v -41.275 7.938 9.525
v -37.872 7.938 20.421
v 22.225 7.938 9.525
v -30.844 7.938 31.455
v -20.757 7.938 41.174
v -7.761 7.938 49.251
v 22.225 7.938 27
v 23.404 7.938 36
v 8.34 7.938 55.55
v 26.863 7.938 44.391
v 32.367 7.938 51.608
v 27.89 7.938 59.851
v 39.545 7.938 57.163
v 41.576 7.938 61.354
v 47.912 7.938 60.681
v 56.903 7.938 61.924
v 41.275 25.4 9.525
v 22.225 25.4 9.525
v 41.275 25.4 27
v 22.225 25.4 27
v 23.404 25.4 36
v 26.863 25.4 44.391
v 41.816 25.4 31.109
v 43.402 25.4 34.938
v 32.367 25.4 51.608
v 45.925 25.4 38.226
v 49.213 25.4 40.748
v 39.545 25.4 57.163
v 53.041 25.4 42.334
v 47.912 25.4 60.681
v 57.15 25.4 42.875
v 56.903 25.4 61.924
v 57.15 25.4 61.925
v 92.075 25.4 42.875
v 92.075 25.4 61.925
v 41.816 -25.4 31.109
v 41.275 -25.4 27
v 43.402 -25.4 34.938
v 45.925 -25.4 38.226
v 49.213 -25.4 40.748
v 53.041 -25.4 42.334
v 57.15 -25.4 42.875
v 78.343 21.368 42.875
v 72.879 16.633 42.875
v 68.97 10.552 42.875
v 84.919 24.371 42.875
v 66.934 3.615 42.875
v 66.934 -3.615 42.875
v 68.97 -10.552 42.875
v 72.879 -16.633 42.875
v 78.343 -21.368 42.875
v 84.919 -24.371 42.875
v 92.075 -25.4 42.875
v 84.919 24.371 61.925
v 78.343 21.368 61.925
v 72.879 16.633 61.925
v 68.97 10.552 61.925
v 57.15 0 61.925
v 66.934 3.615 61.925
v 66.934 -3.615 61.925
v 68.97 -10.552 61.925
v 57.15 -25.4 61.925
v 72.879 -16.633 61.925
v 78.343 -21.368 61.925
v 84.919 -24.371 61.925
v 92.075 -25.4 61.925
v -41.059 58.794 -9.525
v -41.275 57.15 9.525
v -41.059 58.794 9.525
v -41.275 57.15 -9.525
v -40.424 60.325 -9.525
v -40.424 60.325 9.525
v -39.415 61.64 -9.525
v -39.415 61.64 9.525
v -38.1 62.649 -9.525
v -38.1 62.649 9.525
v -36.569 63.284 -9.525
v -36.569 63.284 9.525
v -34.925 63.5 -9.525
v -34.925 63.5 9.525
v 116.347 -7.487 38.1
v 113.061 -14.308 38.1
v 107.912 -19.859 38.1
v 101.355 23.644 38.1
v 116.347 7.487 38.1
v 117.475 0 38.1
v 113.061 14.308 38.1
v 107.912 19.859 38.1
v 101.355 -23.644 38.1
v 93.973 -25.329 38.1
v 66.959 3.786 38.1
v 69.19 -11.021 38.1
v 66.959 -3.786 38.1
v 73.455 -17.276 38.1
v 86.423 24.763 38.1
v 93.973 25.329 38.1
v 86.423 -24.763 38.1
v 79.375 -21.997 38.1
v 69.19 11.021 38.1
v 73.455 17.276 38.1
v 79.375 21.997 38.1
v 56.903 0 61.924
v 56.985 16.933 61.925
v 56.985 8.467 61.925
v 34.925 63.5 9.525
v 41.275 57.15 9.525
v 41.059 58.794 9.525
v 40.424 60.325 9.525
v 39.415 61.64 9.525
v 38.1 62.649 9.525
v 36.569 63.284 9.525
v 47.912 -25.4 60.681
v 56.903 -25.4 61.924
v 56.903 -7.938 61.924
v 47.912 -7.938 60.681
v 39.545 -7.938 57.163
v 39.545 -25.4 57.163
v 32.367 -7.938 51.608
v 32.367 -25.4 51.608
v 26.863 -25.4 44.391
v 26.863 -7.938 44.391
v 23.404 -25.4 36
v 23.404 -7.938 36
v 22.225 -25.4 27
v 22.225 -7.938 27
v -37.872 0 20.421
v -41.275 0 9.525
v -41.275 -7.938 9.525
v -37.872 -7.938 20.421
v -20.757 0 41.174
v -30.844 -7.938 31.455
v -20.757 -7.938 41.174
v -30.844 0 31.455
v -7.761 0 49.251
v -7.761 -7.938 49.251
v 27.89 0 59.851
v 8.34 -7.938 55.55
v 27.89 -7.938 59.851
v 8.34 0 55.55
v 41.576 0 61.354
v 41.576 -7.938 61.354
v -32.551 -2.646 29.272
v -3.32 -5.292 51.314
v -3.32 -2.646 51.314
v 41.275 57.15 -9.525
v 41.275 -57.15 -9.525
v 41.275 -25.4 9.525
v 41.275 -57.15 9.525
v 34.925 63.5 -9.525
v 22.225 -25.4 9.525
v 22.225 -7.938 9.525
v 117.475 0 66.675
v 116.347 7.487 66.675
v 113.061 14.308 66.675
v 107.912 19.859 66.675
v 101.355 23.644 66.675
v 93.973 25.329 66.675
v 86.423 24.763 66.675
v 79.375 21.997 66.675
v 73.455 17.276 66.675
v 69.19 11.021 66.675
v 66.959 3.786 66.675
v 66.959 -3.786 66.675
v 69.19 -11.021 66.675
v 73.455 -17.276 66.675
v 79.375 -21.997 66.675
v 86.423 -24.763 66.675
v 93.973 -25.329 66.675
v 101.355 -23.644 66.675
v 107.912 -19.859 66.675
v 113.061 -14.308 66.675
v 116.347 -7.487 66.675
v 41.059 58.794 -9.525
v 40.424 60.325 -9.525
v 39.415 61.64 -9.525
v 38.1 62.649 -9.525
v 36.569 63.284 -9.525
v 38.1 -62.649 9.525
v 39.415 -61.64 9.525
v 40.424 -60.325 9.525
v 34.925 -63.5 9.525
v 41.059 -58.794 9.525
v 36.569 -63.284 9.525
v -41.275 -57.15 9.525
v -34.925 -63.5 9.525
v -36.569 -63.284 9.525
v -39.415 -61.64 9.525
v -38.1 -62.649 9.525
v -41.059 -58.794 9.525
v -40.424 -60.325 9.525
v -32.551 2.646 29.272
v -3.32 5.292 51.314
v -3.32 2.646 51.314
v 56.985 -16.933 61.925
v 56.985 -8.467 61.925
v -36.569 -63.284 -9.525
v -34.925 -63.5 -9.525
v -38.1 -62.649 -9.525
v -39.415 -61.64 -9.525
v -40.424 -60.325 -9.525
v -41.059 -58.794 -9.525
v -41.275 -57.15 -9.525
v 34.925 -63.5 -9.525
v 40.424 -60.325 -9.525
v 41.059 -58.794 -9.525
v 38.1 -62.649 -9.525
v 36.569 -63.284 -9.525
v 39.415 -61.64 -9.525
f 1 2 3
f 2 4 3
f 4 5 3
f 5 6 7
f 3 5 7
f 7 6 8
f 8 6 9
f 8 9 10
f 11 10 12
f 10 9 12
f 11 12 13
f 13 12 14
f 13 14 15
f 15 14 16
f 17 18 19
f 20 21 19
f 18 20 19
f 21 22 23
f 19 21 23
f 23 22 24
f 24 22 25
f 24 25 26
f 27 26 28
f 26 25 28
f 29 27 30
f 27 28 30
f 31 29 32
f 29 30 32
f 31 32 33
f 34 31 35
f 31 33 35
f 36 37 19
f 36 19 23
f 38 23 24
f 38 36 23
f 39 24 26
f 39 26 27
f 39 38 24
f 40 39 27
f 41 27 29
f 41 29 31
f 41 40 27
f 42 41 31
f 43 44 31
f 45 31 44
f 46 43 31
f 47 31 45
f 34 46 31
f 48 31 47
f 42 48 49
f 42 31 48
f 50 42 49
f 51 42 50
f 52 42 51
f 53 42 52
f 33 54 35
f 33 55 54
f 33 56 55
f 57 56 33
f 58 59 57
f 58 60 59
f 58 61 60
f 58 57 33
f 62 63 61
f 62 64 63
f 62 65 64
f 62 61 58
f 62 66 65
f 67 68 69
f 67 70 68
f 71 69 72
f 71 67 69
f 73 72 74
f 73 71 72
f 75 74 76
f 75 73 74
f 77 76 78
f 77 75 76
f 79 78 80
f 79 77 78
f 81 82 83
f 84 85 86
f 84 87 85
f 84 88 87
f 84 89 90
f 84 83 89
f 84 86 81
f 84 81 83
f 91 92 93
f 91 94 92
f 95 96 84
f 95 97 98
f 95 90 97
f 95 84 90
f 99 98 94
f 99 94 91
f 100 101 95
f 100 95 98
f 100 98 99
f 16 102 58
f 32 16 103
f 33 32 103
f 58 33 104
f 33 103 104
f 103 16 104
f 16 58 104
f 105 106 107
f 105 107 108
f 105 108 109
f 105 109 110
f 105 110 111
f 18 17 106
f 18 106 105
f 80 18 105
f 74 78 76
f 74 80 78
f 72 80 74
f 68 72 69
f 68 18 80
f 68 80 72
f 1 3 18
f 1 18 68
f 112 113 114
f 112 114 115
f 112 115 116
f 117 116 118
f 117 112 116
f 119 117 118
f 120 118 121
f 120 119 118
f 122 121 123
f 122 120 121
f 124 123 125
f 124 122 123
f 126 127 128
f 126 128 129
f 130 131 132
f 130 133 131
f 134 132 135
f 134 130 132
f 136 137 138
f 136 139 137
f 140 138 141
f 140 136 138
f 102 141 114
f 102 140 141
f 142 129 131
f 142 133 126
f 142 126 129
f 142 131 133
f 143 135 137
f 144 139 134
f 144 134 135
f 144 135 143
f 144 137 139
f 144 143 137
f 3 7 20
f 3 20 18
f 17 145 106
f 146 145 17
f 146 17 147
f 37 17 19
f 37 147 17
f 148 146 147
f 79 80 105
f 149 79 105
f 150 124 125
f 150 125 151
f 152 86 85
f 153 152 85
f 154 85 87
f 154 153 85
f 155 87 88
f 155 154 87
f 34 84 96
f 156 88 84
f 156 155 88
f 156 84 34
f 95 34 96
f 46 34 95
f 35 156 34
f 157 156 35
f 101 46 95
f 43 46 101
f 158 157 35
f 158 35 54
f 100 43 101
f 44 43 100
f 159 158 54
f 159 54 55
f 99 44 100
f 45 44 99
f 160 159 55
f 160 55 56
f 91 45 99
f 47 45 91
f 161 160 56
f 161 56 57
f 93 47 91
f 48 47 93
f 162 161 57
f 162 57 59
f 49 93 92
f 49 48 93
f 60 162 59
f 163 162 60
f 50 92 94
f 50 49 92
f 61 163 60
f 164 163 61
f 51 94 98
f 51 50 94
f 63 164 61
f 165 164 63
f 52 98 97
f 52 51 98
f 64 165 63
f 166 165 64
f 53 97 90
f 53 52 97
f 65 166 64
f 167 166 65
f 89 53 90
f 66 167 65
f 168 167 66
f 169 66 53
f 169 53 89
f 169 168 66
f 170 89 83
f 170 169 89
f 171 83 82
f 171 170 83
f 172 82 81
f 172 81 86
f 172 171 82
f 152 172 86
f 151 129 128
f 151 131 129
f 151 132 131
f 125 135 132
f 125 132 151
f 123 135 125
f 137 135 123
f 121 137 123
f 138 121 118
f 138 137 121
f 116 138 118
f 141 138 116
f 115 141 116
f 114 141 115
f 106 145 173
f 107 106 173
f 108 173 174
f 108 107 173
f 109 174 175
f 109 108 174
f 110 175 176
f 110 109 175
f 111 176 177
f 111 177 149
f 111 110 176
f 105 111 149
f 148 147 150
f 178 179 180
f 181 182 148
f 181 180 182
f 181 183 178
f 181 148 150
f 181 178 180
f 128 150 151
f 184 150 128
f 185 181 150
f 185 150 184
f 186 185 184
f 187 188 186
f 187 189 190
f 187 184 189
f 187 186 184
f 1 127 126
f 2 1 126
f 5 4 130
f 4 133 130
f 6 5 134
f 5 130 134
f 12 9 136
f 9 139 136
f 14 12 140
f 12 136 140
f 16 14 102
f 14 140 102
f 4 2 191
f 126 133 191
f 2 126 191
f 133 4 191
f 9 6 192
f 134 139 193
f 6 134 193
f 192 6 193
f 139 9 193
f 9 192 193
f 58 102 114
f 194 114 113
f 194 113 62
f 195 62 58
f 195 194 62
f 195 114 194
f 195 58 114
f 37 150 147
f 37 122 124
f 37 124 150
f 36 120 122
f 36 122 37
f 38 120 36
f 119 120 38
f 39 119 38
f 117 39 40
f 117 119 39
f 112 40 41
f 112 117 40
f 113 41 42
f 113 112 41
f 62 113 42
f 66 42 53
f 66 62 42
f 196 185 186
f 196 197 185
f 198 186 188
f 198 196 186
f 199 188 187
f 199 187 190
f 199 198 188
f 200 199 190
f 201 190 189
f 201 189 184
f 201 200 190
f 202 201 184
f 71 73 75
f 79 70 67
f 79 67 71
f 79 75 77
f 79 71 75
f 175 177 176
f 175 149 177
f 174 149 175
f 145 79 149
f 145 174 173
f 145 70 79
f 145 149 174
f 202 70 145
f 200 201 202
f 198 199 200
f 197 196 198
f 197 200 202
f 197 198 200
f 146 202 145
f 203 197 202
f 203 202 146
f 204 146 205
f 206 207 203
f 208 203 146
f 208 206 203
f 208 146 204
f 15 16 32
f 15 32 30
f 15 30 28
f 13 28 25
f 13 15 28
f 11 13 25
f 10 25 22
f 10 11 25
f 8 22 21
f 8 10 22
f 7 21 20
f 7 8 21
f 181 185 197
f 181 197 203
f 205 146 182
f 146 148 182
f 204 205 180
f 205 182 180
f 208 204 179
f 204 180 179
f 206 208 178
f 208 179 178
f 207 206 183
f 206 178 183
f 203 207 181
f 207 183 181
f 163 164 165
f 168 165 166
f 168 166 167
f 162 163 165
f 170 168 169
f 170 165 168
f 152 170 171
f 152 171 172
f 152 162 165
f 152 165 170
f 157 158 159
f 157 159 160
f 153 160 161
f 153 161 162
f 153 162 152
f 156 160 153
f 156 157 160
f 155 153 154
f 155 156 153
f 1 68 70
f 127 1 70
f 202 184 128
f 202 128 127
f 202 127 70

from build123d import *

# Parameters (mm, degrees)
F1_DEPTH = 63.5
F0_W     = 25.4
F0_H     = 19.05
F2_DEPTH = 25.4
F3_DEPTH = 7.9375
F5_R     = 6.35


with BuildPart() as f1:
    # F0 (on Front) → F1 (new body, symmetric)
    with BuildSketch(Plane.XZ):
        Polygon((41.275, -9.525), (41.275, 9.525), (22.225, 9.525), (-41.275, 9.525), (-41.275, -9.525), align=None)
    extrude(amount=F1_DEPTH, both=True)

    # F0 (on Front) → F2 (join, symmetric)
    with BuildSketch(Plane.XZ):
        with BuildLine():
            Line((22.225, 9.525), (41.275, 9.525))
            Line((41.275, 9.525), (41.275, 27.0002))
            ThreePointArc((41.275, 27.0002), (45.9246798487, 38.2255201513), (57.15, 42.8752))
            Line((57.15, 42.8752), (66.675, 42.8752))
            Line((66.675, 42.8752), (66.675, 61.9252))
            Line((66.675, 61.9252), (57.15, 61.9252))
            add(Edge.make_bspline(
                [(56.9028538387, 61.9243255263), (56.9851686946, 61.9246577884), (57.0675507307, 61.9249493028), (57.15, 61.9252)],
                knots=[111.3887853631, 111.3887853631, 111.3887853631, 111.3887853631, 111.5045361635, 111.5045361635, 111.5045361635, 111.5045361635], degree=3))
            ThreePointArc((56.9028538387, 61.9243255263), (32.3670703438, 51.6083698356), (22.225, 27.0002))
            Line((22.225, 27.0002), (22.225, 9.525))
        make_face()
        with Locations((79.375, 52.4002)):
            Rectangle(F0_W, F0_H)
    extrude(amount=F2_DEPTH, both=True)

    # F0 (on Front) → F3 (join, symmetric)
    with BuildSketch(Plane.XZ):
        Polygon((41.275, -9.525), (41.275, 9.525), (22.225, 9.525), (-41.275, 9.525), (-41.275, -9.525), align=None)
        with BuildLine():
            Line((22.225, 9.525), (41.275, 9.525))
            Line((41.275, 9.525), (41.275, 27.0002))
            ThreePointArc((41.275, 27.0002), (45.9246798487, 38.2255201513), (57.15, 42.8752))
            Line((57.15, 42.8752), (66.675, 42.8752))
            Line((66.675, 42.8752), (66.675, 61.9252))
            Line((66.675, 61.9252), (57.15, 61.9252))
            add(Edge.make_bspline(
                [(56.9028538387, 61.9243255263), (56.9851686946, 61.9246577884), (57.0675507307, 61.9249493028), (57.15, 61.9252)],
                knots=[111.3887853631, 111.3887853631, 111.3887853631, 111.3887853631, 111.5045361635, 111.5045361635, 111.5045361635, 111.5045361635], degree=3))
            ThreePointArc((56.9028538387, 61.9243255263), (32.3670703438, 51.6083698356), (22.225, 27.0002))
            Line((22.225, 27.0002), (22.225, 9.525))
        make_face()
        with Locations((79.375, 52.4002)):
            Rectangle(F0_W, F0_H)
        with BuildLine():
            Line((-41.275, 9.525), (22.225, 9.525))
            Line((22.225, 9.525), (22.225, 27.0002))
            ThreePointArc((22.225, 27.0002), (32.3670703438, 51.6083698356), (56.9028538387, 61.9243255263))
            add(Edge.make_bspline(
                [(-41.275, 9.525), (-39.3105568509, 23.5502866189), (-22.3100050541, 61.6045845118), (56.9028538387, 61.9243255263)],
                knots=[0, 0, 0, 0, 111.3887853631, 111.3887853631, 111.3887853631, 111.3887853631], degree=3))
        make_face()
    extrude(amount=F3_DEPTH, both=True)

    # F0 (on Front) → F4 (revolve)
    with BuildSketch(Plane.XZ):
        Polygon((92.075, 61.9252), (92.075, 42.8752), (92.075, 38.1), (117.475, 38.1), (117.475, 66.675), (92.075, 66.675), align=None)
    revolve(axis=Axis((92.075, 0, 52.3875), (0, 0, 1)))

    # F5
    f5_edges = [f1.edges().sort_by_distance(p)[0] for p in [
        (-41.275, -63.5, 0),
        (41.275, -63.5, 0),
        (41.275, 63.5, 0),
        (-41.275, 63.5, 0),
    ]]
    fillet(f5_edges, radius=F5_R)


solid = f1.part
